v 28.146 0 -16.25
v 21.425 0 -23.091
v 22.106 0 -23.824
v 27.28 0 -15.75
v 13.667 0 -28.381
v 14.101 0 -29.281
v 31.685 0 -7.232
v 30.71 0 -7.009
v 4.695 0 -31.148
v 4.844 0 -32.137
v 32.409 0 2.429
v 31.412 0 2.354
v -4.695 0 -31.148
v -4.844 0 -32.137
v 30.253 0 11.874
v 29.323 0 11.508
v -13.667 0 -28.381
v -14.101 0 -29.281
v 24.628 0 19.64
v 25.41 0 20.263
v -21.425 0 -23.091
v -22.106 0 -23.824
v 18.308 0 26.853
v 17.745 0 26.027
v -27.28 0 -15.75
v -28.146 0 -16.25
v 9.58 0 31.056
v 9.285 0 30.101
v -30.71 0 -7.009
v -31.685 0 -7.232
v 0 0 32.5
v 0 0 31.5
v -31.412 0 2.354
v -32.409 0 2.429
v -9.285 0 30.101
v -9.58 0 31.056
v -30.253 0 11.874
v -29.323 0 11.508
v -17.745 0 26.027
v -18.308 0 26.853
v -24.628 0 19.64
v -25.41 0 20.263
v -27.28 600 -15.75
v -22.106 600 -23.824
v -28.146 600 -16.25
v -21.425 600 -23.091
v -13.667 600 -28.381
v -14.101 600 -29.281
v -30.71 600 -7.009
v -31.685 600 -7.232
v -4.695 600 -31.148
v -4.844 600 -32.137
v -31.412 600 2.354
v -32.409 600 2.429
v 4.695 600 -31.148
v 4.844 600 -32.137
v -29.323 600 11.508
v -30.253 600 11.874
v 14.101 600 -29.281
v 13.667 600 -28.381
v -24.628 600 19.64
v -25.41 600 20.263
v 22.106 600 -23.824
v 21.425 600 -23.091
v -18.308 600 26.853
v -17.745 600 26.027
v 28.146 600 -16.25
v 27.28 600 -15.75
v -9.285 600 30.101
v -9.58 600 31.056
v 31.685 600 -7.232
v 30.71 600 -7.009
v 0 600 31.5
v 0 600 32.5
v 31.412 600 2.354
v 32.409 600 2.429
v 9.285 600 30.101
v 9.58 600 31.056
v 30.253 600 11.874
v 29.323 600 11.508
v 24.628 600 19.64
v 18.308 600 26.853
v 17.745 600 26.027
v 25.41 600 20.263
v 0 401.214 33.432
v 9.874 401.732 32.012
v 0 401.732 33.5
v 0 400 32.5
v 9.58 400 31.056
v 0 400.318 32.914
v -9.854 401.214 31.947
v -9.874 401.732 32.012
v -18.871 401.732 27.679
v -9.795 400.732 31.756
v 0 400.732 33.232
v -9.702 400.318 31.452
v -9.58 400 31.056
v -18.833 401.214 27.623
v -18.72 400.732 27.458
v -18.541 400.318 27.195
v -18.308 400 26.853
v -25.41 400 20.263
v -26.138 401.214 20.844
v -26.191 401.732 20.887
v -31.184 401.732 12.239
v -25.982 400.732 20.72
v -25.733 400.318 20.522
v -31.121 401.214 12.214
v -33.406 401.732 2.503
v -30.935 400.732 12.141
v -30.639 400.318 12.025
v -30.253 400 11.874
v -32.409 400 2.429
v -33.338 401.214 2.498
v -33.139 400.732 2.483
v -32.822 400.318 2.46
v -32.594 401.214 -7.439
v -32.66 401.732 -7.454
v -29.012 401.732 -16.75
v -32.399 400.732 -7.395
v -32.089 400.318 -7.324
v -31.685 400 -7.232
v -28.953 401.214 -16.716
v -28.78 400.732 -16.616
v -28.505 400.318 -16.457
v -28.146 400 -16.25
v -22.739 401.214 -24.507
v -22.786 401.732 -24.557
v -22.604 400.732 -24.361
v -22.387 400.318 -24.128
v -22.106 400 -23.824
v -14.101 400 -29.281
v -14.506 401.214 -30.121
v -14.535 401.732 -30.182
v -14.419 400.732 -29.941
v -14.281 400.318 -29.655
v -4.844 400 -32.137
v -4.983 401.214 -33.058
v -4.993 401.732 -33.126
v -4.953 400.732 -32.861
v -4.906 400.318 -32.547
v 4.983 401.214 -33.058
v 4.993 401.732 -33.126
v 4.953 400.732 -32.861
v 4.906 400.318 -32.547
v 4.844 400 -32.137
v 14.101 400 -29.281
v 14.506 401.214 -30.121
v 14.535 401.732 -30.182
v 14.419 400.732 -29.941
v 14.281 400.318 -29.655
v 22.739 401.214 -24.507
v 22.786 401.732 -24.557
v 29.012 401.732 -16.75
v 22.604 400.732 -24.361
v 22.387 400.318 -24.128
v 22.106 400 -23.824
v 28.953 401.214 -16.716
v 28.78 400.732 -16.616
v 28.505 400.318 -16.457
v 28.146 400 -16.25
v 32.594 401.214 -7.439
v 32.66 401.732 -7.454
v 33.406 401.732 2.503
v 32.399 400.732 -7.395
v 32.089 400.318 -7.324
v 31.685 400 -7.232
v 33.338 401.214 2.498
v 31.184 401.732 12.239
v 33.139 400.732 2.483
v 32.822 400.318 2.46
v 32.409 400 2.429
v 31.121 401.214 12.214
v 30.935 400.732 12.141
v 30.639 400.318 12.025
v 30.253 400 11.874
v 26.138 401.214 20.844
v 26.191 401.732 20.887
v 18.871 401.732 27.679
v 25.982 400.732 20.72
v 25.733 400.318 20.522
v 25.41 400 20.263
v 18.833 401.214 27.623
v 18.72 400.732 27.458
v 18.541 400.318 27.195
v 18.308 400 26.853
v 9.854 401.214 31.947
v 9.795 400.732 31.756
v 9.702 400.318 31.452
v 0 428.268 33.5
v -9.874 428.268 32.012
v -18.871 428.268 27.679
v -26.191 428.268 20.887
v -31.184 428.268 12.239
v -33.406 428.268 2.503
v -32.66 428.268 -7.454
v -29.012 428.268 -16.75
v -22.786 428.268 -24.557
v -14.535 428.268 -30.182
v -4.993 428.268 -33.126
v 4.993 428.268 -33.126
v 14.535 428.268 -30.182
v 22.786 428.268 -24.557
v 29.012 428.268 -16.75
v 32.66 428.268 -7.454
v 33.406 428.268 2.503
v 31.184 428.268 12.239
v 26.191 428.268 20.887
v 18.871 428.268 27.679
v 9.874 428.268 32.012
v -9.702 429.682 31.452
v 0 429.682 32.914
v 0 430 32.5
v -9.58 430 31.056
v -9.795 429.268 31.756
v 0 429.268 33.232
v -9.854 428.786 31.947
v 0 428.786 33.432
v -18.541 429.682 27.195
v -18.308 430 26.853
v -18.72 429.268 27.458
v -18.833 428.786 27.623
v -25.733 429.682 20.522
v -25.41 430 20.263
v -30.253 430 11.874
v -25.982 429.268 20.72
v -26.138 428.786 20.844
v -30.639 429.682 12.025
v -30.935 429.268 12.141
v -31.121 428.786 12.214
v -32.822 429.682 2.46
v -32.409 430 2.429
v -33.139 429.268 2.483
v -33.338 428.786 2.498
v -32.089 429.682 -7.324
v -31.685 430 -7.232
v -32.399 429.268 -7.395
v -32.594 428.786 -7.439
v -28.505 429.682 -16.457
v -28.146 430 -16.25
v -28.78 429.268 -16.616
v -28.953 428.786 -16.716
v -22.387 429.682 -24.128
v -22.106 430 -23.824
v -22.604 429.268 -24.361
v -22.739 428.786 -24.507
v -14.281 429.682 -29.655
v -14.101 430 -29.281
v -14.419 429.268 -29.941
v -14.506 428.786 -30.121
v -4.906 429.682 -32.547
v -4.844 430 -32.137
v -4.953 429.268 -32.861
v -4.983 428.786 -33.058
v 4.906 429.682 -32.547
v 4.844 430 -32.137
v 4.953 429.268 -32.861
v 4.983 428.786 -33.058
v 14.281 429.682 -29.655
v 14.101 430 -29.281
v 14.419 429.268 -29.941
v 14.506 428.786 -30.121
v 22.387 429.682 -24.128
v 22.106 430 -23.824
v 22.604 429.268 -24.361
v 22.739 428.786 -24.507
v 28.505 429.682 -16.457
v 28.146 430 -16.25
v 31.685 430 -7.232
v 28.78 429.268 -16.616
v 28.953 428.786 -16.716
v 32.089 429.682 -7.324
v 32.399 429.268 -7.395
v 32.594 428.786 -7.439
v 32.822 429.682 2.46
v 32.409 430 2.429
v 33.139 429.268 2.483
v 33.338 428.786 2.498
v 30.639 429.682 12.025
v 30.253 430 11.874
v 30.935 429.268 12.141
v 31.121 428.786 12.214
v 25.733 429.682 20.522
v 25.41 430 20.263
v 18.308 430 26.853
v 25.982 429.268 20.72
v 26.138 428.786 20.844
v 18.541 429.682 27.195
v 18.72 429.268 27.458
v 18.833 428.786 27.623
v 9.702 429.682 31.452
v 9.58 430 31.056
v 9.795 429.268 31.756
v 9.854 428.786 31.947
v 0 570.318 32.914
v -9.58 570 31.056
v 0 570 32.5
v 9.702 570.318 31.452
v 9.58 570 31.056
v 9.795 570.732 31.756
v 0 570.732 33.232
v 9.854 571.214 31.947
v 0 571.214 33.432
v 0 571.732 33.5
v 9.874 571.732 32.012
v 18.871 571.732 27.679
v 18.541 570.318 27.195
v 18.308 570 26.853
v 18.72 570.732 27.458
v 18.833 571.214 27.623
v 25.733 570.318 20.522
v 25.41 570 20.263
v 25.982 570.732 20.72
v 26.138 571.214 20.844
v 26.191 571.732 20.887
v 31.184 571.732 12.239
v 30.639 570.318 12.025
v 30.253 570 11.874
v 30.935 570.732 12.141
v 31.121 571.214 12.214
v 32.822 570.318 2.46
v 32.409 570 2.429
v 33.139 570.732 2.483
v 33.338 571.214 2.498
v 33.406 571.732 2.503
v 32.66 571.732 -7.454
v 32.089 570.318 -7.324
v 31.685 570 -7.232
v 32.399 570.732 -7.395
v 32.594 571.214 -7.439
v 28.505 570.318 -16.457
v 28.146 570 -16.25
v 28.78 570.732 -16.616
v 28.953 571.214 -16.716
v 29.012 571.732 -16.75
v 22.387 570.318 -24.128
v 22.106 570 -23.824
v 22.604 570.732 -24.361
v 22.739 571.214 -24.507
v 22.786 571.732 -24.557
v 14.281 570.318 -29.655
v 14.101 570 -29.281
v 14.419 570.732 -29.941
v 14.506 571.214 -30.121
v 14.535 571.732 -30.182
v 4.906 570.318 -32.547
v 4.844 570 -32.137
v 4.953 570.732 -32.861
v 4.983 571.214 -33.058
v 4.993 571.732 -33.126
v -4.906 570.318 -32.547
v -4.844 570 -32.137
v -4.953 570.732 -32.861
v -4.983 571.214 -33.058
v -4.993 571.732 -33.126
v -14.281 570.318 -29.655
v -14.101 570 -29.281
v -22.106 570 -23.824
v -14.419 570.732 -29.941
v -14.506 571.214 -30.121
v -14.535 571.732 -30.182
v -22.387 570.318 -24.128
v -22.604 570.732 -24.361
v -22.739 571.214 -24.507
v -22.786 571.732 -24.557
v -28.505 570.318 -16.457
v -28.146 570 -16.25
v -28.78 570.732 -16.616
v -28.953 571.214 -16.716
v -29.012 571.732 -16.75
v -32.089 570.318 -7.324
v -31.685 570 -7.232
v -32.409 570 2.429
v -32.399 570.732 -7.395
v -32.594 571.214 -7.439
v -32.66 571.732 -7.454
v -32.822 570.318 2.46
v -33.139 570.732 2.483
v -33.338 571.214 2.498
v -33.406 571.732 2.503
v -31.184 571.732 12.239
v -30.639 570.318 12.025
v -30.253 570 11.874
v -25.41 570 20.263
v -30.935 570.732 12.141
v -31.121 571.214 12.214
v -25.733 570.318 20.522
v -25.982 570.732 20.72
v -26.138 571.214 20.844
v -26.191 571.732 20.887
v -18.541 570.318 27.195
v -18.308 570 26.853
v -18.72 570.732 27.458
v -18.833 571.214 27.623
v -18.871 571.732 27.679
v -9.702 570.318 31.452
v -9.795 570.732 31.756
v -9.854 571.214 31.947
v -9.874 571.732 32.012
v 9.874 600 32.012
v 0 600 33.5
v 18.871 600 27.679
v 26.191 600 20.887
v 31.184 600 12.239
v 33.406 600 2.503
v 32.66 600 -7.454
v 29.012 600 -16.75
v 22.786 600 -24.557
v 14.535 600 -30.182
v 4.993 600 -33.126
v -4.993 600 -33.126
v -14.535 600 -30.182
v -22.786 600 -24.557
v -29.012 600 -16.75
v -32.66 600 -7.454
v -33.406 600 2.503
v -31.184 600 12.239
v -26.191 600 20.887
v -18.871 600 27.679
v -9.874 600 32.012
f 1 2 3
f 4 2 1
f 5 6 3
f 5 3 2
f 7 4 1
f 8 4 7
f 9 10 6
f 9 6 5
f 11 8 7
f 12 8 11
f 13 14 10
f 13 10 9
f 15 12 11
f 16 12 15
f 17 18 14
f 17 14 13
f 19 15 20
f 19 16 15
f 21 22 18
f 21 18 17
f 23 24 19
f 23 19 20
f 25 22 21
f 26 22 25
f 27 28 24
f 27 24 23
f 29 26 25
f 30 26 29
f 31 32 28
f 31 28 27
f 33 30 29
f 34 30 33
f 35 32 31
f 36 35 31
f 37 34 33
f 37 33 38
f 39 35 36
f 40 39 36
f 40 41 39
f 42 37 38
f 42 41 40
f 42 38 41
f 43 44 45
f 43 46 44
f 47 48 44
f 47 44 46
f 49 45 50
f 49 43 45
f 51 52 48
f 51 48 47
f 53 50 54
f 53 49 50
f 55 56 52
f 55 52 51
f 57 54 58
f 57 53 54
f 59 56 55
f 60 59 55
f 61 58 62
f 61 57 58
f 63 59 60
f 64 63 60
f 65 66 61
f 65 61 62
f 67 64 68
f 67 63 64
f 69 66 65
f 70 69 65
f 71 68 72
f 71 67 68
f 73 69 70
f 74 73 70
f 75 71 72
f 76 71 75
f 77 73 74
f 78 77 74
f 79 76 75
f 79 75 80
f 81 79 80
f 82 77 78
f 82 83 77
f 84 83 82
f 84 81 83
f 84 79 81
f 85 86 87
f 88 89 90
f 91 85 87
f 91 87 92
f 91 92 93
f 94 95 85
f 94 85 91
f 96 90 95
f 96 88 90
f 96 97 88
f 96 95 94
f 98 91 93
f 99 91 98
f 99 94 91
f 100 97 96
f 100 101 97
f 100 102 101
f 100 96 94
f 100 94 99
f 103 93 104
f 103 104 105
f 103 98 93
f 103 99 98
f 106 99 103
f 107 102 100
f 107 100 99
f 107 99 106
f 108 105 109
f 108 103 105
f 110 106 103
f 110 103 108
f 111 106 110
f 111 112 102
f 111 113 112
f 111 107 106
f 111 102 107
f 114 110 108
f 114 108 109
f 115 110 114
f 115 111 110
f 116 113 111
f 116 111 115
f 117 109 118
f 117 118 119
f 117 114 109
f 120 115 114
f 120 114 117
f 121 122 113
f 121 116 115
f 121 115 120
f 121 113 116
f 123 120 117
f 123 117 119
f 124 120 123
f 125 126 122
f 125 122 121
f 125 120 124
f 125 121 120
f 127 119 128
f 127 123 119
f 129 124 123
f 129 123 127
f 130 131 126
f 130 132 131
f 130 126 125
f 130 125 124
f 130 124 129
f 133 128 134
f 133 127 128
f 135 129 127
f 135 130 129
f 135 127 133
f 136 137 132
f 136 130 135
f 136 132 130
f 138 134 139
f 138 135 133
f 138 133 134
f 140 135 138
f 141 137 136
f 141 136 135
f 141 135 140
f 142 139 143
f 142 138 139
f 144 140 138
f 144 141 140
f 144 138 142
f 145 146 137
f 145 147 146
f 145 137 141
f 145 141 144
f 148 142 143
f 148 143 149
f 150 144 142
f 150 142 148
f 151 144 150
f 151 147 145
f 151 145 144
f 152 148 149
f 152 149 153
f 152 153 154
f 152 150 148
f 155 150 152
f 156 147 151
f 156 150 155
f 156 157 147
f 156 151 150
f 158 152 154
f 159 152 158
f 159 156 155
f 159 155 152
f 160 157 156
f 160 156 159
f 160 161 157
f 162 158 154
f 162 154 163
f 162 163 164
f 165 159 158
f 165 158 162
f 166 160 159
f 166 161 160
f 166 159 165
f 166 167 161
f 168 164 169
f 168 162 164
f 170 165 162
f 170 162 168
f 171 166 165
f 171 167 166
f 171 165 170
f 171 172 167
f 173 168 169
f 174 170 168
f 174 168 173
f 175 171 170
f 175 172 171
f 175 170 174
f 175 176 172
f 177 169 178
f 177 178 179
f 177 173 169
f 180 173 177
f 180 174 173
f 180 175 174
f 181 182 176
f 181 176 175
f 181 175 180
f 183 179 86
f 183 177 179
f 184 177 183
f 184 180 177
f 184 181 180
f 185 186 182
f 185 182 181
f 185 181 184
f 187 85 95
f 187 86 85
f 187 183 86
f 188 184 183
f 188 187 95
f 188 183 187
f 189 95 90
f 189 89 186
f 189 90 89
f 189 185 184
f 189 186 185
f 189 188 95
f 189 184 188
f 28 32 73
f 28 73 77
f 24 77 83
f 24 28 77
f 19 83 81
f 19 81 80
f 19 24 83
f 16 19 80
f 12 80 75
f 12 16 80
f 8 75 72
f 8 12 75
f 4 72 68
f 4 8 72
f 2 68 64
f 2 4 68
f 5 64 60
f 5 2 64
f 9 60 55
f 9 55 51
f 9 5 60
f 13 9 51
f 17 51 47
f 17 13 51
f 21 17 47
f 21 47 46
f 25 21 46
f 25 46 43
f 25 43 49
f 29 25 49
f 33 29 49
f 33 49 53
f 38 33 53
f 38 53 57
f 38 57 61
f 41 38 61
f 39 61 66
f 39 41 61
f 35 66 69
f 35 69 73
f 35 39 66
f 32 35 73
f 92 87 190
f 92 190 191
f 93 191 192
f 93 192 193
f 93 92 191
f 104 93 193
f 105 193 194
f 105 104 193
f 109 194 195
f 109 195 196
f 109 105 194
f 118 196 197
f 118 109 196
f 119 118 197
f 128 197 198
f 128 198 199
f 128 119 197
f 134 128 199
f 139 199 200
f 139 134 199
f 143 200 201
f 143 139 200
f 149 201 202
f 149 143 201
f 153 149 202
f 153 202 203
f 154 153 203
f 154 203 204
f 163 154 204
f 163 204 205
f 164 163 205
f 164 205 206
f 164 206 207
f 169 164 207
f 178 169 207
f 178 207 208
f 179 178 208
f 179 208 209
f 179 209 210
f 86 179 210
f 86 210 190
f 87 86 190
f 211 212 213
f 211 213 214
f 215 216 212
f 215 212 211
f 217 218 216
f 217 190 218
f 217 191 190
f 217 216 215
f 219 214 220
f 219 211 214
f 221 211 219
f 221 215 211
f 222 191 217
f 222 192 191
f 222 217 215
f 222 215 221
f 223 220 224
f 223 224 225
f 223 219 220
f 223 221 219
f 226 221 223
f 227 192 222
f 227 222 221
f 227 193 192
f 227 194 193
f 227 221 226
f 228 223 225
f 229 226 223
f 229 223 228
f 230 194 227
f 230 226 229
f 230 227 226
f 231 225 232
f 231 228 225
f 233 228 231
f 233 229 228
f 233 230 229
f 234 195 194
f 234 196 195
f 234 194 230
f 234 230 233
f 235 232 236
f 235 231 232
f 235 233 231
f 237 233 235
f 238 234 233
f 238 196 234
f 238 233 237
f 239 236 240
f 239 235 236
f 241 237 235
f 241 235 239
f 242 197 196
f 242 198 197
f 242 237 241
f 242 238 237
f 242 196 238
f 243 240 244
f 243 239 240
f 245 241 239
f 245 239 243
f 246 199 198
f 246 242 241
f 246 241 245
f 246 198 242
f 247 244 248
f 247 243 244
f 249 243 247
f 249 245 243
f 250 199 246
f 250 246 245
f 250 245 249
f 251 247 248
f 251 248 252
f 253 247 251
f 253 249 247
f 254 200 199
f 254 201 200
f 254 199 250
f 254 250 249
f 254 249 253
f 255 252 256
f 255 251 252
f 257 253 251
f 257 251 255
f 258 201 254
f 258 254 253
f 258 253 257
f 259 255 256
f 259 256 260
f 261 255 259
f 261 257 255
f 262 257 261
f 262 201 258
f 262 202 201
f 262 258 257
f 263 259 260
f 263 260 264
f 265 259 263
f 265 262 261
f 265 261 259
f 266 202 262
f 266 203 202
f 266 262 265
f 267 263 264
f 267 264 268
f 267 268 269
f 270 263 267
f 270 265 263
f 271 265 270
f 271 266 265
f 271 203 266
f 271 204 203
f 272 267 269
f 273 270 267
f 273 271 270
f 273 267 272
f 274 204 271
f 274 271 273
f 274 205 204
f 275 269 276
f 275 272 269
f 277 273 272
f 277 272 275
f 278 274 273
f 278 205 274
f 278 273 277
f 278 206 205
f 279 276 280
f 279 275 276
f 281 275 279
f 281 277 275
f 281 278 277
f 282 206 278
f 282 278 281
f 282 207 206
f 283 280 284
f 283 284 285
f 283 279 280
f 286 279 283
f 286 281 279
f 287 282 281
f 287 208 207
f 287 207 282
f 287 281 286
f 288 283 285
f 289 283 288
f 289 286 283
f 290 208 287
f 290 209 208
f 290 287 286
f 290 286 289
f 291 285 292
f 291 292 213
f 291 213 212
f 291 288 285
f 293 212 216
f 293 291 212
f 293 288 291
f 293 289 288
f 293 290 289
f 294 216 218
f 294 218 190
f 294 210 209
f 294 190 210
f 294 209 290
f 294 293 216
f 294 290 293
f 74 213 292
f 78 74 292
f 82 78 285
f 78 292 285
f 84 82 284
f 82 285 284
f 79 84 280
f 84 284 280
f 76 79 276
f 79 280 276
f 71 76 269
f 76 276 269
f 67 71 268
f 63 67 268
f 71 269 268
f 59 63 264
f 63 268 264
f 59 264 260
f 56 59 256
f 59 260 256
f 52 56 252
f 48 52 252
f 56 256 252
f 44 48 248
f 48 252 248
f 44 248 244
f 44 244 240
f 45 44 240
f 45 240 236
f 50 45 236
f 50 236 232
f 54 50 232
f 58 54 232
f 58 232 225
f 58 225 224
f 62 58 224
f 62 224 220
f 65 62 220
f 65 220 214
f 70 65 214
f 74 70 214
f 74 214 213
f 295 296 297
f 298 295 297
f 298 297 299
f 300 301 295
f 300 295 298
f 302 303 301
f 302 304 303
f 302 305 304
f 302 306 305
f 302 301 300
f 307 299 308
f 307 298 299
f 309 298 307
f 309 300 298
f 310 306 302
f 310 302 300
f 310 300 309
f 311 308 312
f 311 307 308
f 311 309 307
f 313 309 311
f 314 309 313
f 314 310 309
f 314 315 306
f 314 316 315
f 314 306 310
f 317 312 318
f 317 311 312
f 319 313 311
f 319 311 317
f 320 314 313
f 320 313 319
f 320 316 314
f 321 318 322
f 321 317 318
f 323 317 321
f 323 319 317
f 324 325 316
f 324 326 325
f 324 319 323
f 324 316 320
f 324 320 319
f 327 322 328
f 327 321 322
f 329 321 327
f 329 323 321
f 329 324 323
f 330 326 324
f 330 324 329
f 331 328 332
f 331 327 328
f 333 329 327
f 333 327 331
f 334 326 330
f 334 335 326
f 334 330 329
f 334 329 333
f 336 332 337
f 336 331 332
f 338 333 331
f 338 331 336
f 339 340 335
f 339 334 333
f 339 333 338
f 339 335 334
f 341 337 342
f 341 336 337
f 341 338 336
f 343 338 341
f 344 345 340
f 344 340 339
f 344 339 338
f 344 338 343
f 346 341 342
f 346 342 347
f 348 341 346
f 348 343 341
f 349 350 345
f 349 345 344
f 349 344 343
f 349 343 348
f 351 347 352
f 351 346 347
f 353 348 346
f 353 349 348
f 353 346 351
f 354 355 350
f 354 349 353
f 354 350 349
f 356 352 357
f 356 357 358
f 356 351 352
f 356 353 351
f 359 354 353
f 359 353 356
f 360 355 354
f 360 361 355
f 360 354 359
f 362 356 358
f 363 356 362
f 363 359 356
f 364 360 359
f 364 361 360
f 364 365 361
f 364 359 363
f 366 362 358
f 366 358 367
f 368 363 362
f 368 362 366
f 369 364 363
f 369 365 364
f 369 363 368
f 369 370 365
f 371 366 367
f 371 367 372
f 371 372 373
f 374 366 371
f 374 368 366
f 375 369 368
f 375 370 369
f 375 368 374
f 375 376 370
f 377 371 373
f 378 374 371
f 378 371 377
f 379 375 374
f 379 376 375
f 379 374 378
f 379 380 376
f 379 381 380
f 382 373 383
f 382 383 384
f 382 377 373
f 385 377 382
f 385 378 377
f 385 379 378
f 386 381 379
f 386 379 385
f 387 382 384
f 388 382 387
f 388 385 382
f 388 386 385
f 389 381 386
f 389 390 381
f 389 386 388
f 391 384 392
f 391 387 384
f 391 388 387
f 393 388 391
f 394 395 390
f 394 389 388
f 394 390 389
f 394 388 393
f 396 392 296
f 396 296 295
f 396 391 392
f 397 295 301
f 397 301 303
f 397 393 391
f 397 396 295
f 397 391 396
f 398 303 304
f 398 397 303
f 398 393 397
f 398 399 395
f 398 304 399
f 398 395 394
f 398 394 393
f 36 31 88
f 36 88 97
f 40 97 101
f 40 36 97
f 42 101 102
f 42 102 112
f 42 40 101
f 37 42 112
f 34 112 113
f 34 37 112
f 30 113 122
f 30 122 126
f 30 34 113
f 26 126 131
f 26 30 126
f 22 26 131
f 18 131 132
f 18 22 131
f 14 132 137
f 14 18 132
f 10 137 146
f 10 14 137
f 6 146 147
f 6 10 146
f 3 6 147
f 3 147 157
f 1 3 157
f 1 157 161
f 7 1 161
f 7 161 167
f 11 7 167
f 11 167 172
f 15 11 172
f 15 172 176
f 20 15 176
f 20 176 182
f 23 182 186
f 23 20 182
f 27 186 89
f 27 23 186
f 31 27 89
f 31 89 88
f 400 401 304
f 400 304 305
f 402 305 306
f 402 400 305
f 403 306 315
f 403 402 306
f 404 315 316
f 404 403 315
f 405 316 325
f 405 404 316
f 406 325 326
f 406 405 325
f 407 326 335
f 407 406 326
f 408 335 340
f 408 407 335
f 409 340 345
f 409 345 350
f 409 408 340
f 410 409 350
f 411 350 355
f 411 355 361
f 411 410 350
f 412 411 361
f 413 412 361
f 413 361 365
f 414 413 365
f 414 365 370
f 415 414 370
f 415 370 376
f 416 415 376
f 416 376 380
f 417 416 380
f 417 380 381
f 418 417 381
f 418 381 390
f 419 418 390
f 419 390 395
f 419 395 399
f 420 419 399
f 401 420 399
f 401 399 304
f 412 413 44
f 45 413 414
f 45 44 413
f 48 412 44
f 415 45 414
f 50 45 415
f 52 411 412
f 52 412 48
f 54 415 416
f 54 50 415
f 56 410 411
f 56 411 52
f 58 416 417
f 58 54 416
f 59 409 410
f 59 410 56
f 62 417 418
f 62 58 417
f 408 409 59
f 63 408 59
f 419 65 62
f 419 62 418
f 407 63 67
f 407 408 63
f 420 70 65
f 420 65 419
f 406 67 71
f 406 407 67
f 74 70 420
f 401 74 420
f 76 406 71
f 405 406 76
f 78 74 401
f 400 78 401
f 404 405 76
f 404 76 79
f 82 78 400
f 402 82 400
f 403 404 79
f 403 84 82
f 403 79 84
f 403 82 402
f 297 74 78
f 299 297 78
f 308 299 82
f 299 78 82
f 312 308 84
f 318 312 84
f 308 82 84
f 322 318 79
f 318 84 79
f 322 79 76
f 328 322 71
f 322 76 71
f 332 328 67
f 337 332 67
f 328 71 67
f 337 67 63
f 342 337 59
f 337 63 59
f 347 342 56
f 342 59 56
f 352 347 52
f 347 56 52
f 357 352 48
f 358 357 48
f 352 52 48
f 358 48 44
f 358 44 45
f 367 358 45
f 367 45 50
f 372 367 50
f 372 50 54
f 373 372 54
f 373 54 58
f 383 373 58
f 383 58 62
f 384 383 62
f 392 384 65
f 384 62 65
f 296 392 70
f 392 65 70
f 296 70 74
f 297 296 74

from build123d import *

# Parameters (mm, degrees)
ESBO_O1_R                = 32.5
ESBO_O1_R_2              = 31.5
RESSALTO_EXTRUS_O1_DEPTH = 600
ESBO_O2_R                = 33.5
ESBO_O2_R_2              = 32.5
RESSALTO_EXTRUS_O2_DEPTH = 30
ESBO_O4_R                = 33.5
ESBO_O4_R_2              = 32.5
RESSALTO_EXTRUS_O3_DEPTH = 430
ESBO_O5_R                = 33.5
ESBO_O5_R_2              = 32.5
CORTE_EXTRUS_O1_DEPTH    = 400
FILETE4_R                = 2
FILETE8_R                = 2
FILETE9_R                = 2


with BuildPart() as part:
    # Esboço1 → Ressalto-extrusão1 (new body)
    with BuildSketch(Plane(origin=(0, 0, 0), x_dir=(1, 0, 0), z_dir=(0, 1, 0))):
        with Locations(Location((0, 0, 0), (0, 0, 270))):
            Circle(ESBO_O1_R)
        with Locations(Location((0, 0, 0), (0, 0, 270))):
            Circle(ESBO_O1_R_2, mode=Mode.SUBTRACT)
    extrude(amount=RESSALTO_EXTRUS_O1_DEPTH)

    # Esboço4 → Ressalto-extrusão3 (add)
    with BuildSketch(Plane.XZ):
        with Locations(Location((0, 0, 0), (0, 0, 90))):
            Circle(ESBO_O4_R)
        with Locations(Location((0, 0, 0), (0, 0, 90))):
            Circle(ESBO_O4_R_2, mode=Mode.SUBTRACT)
    extrude(amount=-RESSALTO_EXTRUS_O3_DEPTH)

    # Esboço5 → Corte-extrusão1 (cut)
    with BuildSketch(Plane.XZ):
        with Locations(Location((0, 0, 0), (0, 0, 90))):
            Circle(ESBO_O5_R)
        with Locations(Location((0, 0, 0), (0, 0, 90))):
            Circle(ESBO_O5_R_2, mode=Mode.SUBTRACT)
    extrude(amount=-CORTE_EXTRUS_O1_DEPTH, mode=Mode.SUBTRACT)

    # Filete4
    # the kernel refuses this fillet: 2 mm, written as the material it takes off along each edge
    with BuildSketch(Plane(origin=(0, 400, 0), x_dir=(0, 0, 1), z_dir=(1, 0, 0))) as filete4_piece_1:
        with BuildLine():
            CenterArc((31.5, -1.732050808), FILETE4_R, 0, 60)
            Line((32.5, 0), (32.52, 0.034641016))
            ThreePointArc((32.52, 0.034641016), (33, 0.04), (33.5, 0.04))
            Line((33.5, 0.04), (33.54, 0))
            Line((33.54, 0), (33.54, -1.732050808))
            Line((33.54, -1.732050808), (33.5, -1.732050808))
        make_face()
    revolve(axis=Axis((0, 400, 0), (0, -1, 0)), mode=Mode.SUBTRACT)

    # Filete8
    # the kernel refuses this fillet: 2 mm, written as the material it takes off along each edge
    with BuildSketch(Plane(origin=(0, 430, 0), x_dir=(0, 0, 1), z_dir=(1, 0, 0))) as filete8_piece_1:
        with BuildLine():
            CenterArc((31.5, 1.732050808), FILETE8_R, 300, 60)
            Line((33.5, 1.732050808), (33.54, 1.732050808))
            Line((33.54, 1.732050808), (33.54, 0))
            Line((33.54, 0), (33.5, -0.04))
            ThreePointArc((33.5, -0.04), (33, -0.04), (32.52, -0.034641016))
            Line((32.52, -0.034641016), (32.5, 0))
        make_face()
    revolve(axis=Axis((0, 430, 0), (0, -1, 0)), mode=Mode.SUBTRACT)


with BuildPart() as body_2:
    # Esboço2 → Ressalto-extrusão2 (new body)
    with BuildSketch(Plane(origin=(0, 600, 0), x_dir=(1, 0, 0), z_dir=(0, 1, 0))):
        with Locations(Location((0, 0, 0), (0, 0, 270))):
            Circle(ESBO_O2_R)
        with Locations(Location((0, 0, 0), (0, 0, 270))):
            Circle(ESBO_O2_R_2, mode=Mode.SUBTRACT)
    extrude(amount=-RESSALTO_EXTRUS_O2_DEPTH)

    # Filete9
    # the kernel refuses this fillet: 2 mm, written as the material it takes off along each edge
    with BuildSketch(Plane(origin=(0, 570, 0), x_dir=(0, 0, 1), z_dir=(-1, 0, 0))) as filete9_piece_1:
        with BuildLine():
            CenterArc((31.5, 1.732050808), FILETE9_R, 300, 60)
            Line((32.5, 0), (32.52, -0.034641016))
            ThreePointArc((32.52, -0.034641016), (33, -0.04), (33.5, -0.04))
            Line((33.5, -0.04), (33.54, 0))
            Line((33.54, 0), (33.54, 1.732050808))
            Line((33.54, 1.732050808), (33.5, 1.732050808))
        make_face()
    revolve(axis=Axis((0, 570, 0), (0, 1, 0)), mode=Mode.SUBTRACT)


solid = Compound([part.part, body_2.part])
